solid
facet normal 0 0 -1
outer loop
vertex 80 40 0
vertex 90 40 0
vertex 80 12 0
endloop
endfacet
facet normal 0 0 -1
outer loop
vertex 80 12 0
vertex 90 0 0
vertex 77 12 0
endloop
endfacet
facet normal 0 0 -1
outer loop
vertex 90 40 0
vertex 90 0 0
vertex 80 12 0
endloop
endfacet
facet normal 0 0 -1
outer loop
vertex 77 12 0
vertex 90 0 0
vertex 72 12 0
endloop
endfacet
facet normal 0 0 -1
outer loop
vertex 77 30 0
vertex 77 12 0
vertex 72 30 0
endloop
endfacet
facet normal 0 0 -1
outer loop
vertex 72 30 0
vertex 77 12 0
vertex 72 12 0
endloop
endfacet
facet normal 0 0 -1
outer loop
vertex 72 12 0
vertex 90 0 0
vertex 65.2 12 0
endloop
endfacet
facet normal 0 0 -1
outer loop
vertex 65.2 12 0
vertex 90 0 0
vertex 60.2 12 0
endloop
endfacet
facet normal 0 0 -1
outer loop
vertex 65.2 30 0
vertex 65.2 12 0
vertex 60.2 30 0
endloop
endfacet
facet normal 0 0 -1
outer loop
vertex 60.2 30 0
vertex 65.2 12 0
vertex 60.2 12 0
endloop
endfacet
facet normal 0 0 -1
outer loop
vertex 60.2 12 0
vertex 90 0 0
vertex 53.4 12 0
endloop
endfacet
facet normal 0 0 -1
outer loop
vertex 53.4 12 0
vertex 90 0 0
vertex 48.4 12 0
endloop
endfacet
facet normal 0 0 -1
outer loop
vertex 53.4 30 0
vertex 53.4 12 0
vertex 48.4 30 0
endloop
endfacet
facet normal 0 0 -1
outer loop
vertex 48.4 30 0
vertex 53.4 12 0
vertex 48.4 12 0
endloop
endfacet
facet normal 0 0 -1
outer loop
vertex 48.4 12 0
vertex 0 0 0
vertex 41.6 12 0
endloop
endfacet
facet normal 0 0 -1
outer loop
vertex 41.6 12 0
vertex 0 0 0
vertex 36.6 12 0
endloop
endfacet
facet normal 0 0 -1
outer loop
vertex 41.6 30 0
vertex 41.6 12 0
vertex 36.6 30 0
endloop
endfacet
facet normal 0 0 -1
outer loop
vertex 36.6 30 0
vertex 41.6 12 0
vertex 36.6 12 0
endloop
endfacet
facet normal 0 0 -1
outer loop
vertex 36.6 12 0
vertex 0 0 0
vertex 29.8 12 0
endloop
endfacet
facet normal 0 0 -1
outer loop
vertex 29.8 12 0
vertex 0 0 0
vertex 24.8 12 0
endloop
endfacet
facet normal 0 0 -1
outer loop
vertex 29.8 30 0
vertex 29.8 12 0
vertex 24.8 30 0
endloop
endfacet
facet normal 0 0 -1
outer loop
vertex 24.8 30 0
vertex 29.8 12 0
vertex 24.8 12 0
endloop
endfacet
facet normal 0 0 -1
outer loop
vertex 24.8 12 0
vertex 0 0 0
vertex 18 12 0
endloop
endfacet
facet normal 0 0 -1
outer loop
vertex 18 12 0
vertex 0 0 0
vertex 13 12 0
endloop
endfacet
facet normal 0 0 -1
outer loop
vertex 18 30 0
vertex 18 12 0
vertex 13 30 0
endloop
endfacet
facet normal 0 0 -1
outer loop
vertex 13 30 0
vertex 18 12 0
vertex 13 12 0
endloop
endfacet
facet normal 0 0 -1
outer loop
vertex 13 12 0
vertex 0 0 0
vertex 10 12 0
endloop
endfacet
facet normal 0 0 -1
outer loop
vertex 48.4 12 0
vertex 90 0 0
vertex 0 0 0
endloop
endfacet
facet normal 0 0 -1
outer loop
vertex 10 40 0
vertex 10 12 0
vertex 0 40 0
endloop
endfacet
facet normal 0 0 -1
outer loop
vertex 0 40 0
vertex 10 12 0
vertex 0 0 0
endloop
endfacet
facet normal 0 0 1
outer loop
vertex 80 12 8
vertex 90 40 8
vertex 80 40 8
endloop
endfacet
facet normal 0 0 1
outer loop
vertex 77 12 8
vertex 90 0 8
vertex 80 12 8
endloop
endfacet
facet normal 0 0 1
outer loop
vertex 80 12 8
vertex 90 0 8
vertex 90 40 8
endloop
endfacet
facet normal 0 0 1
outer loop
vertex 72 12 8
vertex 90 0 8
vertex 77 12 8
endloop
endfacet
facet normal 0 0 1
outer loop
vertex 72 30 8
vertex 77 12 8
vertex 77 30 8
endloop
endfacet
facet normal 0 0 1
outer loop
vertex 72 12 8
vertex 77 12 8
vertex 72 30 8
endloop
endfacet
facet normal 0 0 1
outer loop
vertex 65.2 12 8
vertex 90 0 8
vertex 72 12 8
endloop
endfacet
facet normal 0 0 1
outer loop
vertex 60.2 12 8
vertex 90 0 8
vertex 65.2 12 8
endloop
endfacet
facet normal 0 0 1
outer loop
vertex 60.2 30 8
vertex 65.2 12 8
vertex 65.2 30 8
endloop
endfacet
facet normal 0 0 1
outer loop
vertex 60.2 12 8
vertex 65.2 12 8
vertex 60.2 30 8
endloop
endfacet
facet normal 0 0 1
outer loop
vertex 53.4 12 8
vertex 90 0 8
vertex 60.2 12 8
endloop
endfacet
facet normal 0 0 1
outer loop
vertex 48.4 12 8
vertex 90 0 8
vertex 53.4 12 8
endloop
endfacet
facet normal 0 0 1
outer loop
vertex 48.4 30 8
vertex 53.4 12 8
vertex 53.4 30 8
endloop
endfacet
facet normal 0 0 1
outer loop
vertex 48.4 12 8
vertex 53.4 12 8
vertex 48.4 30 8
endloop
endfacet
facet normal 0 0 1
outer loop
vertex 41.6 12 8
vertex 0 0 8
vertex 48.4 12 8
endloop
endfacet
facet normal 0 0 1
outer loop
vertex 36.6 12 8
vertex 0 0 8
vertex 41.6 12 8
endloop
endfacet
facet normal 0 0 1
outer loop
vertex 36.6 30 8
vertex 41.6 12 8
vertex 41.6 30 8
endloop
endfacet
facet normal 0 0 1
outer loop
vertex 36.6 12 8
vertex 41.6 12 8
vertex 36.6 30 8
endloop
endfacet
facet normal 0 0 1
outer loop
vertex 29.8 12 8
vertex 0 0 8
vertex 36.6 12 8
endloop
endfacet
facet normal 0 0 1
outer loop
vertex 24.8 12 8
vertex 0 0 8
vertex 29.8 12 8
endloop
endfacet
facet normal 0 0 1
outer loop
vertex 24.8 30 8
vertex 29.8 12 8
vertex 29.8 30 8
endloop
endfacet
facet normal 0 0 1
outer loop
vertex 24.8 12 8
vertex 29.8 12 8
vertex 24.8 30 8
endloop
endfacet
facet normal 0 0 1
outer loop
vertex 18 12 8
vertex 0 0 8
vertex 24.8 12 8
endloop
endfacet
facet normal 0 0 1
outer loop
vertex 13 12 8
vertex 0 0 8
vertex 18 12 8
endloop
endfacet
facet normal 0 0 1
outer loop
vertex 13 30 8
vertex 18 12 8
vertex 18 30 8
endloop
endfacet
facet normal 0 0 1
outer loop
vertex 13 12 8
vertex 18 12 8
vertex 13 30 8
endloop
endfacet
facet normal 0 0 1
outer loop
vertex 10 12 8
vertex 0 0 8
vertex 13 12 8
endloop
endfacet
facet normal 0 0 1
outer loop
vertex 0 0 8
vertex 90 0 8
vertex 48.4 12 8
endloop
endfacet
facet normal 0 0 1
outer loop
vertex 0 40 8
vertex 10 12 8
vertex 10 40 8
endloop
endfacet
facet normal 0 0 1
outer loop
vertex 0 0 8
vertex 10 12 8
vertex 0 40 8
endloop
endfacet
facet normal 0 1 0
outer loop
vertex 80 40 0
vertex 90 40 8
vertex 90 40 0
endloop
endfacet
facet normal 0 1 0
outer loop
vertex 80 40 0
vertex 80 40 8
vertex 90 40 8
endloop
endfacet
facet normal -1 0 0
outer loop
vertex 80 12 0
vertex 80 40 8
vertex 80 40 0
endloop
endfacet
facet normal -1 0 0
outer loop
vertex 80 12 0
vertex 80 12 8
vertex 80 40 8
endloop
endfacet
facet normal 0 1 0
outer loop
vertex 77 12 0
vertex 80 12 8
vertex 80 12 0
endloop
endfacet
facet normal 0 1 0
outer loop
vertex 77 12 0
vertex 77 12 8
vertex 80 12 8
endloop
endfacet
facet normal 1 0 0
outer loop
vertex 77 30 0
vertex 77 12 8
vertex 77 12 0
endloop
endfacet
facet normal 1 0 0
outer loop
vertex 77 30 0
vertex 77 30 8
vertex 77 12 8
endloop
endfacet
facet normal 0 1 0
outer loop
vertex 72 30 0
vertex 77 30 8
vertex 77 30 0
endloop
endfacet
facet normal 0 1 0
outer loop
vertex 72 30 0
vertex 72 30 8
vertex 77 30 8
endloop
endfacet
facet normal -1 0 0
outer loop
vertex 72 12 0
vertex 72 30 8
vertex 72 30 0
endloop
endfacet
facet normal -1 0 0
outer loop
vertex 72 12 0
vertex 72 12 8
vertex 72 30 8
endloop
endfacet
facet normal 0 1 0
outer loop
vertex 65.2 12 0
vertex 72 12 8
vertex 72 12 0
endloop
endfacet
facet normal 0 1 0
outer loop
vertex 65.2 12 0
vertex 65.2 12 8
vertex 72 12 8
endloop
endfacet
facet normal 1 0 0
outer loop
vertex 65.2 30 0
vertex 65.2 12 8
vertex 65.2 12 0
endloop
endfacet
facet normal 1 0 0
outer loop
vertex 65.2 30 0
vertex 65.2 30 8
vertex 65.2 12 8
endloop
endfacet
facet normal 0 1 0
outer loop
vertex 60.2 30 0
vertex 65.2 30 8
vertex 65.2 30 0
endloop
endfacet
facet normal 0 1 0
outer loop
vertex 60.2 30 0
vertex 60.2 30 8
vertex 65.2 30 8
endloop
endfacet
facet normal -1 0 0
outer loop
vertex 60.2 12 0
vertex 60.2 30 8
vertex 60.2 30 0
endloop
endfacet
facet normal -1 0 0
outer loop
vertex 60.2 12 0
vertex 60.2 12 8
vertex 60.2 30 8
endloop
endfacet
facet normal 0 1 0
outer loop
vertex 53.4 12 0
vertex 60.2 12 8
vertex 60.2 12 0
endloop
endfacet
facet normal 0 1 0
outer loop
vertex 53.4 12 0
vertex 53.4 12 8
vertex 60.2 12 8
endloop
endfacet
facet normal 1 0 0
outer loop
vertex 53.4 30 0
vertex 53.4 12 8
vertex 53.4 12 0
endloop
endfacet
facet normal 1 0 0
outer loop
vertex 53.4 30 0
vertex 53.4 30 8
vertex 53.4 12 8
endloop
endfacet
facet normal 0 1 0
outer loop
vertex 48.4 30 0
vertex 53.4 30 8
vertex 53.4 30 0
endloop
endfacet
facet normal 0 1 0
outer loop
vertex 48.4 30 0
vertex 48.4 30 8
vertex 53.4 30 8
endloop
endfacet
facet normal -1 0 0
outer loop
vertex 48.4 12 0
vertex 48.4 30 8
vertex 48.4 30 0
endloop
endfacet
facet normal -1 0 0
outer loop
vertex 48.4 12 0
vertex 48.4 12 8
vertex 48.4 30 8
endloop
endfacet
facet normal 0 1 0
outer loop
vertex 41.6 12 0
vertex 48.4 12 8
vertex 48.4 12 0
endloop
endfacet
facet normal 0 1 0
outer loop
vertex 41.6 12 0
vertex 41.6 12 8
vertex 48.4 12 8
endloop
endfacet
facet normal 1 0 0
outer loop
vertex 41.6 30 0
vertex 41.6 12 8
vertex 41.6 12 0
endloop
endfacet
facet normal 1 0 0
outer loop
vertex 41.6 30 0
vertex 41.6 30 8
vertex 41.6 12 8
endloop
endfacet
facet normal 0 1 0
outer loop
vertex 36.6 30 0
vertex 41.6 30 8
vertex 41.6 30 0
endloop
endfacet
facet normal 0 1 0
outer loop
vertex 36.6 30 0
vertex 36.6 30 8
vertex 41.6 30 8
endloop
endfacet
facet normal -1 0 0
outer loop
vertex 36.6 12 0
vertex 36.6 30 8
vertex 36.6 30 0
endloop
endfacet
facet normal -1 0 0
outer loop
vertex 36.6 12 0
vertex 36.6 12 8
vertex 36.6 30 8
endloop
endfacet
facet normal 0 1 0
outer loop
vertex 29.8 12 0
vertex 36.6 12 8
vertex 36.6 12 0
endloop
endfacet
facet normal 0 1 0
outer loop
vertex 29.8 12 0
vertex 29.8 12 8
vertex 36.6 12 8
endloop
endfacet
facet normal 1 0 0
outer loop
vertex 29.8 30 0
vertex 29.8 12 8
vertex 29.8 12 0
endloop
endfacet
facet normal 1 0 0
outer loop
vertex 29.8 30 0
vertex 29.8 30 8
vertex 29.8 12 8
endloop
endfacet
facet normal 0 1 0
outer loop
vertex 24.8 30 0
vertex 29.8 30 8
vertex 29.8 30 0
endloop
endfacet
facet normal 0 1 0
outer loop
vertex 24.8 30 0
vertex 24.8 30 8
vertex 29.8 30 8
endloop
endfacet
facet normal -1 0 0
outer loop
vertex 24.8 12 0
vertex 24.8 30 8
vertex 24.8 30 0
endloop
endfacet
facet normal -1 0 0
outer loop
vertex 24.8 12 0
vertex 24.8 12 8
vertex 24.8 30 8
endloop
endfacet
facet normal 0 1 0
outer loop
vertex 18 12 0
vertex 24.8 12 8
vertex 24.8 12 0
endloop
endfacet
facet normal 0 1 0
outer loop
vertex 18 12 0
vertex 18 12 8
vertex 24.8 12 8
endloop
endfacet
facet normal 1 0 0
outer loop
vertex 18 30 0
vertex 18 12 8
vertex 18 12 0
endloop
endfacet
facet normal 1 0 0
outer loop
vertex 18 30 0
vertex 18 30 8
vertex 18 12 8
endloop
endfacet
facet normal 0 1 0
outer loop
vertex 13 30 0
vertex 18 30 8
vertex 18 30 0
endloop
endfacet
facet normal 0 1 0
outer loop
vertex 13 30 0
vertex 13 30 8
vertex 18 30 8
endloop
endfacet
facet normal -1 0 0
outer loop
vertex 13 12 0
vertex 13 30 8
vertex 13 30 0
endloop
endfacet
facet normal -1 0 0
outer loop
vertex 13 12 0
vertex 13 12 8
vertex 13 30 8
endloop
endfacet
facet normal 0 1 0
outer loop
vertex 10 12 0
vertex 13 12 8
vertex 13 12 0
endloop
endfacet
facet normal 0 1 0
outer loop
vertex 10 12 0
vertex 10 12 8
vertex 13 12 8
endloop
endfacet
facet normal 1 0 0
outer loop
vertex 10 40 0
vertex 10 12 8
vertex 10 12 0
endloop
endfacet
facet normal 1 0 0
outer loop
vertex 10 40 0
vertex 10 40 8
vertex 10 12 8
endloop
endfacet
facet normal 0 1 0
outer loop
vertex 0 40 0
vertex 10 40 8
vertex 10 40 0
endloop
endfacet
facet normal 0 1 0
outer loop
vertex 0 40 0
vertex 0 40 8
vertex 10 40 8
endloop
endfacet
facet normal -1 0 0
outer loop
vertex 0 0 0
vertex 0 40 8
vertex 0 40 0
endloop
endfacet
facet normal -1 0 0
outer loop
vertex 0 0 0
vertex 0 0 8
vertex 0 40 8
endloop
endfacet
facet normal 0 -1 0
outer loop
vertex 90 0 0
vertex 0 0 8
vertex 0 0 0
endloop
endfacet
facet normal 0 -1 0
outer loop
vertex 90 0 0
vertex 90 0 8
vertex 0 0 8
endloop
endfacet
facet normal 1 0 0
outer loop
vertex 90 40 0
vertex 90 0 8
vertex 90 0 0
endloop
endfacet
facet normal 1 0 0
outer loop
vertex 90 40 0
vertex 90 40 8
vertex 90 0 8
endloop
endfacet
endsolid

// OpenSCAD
$fn = 32;

// ----------------------------------------------------------------------
// Guard grille: 6 slats over a 90 x 40 mm plate
// ----------------------------------------------------------------------

// --- parameters (mm) ---
profile_height = 8;       // extrusion height
profile_points = 32;      // points of the closed outline

profile = [[0, 0], [90, 0], [90, 40], [80, 40], [80, 12], [77, 12], [77, 30], [72, 30], [72, 12], [65.2, 12], [65.2, 30], [60.2, 30], [60.2, 12], [53.4, 12], [53.4, 30], [48.4, 30], [48.4, 12], [41.6, 12], [41.6, 30], [36.6, 30], [36.6, 12], [29.8, 12], [29.8, 30], [24.8, 30], [24.8, 12], [18, 12], [18, 30], [13, 30], [13, 12], [10, 12], [10, 40], [0, 40]];  // single closed polygon, 32 points, counter clockwise

// --- the one profile operation ---
linear_extrude(height = profile_height) polygon(points = profile);
